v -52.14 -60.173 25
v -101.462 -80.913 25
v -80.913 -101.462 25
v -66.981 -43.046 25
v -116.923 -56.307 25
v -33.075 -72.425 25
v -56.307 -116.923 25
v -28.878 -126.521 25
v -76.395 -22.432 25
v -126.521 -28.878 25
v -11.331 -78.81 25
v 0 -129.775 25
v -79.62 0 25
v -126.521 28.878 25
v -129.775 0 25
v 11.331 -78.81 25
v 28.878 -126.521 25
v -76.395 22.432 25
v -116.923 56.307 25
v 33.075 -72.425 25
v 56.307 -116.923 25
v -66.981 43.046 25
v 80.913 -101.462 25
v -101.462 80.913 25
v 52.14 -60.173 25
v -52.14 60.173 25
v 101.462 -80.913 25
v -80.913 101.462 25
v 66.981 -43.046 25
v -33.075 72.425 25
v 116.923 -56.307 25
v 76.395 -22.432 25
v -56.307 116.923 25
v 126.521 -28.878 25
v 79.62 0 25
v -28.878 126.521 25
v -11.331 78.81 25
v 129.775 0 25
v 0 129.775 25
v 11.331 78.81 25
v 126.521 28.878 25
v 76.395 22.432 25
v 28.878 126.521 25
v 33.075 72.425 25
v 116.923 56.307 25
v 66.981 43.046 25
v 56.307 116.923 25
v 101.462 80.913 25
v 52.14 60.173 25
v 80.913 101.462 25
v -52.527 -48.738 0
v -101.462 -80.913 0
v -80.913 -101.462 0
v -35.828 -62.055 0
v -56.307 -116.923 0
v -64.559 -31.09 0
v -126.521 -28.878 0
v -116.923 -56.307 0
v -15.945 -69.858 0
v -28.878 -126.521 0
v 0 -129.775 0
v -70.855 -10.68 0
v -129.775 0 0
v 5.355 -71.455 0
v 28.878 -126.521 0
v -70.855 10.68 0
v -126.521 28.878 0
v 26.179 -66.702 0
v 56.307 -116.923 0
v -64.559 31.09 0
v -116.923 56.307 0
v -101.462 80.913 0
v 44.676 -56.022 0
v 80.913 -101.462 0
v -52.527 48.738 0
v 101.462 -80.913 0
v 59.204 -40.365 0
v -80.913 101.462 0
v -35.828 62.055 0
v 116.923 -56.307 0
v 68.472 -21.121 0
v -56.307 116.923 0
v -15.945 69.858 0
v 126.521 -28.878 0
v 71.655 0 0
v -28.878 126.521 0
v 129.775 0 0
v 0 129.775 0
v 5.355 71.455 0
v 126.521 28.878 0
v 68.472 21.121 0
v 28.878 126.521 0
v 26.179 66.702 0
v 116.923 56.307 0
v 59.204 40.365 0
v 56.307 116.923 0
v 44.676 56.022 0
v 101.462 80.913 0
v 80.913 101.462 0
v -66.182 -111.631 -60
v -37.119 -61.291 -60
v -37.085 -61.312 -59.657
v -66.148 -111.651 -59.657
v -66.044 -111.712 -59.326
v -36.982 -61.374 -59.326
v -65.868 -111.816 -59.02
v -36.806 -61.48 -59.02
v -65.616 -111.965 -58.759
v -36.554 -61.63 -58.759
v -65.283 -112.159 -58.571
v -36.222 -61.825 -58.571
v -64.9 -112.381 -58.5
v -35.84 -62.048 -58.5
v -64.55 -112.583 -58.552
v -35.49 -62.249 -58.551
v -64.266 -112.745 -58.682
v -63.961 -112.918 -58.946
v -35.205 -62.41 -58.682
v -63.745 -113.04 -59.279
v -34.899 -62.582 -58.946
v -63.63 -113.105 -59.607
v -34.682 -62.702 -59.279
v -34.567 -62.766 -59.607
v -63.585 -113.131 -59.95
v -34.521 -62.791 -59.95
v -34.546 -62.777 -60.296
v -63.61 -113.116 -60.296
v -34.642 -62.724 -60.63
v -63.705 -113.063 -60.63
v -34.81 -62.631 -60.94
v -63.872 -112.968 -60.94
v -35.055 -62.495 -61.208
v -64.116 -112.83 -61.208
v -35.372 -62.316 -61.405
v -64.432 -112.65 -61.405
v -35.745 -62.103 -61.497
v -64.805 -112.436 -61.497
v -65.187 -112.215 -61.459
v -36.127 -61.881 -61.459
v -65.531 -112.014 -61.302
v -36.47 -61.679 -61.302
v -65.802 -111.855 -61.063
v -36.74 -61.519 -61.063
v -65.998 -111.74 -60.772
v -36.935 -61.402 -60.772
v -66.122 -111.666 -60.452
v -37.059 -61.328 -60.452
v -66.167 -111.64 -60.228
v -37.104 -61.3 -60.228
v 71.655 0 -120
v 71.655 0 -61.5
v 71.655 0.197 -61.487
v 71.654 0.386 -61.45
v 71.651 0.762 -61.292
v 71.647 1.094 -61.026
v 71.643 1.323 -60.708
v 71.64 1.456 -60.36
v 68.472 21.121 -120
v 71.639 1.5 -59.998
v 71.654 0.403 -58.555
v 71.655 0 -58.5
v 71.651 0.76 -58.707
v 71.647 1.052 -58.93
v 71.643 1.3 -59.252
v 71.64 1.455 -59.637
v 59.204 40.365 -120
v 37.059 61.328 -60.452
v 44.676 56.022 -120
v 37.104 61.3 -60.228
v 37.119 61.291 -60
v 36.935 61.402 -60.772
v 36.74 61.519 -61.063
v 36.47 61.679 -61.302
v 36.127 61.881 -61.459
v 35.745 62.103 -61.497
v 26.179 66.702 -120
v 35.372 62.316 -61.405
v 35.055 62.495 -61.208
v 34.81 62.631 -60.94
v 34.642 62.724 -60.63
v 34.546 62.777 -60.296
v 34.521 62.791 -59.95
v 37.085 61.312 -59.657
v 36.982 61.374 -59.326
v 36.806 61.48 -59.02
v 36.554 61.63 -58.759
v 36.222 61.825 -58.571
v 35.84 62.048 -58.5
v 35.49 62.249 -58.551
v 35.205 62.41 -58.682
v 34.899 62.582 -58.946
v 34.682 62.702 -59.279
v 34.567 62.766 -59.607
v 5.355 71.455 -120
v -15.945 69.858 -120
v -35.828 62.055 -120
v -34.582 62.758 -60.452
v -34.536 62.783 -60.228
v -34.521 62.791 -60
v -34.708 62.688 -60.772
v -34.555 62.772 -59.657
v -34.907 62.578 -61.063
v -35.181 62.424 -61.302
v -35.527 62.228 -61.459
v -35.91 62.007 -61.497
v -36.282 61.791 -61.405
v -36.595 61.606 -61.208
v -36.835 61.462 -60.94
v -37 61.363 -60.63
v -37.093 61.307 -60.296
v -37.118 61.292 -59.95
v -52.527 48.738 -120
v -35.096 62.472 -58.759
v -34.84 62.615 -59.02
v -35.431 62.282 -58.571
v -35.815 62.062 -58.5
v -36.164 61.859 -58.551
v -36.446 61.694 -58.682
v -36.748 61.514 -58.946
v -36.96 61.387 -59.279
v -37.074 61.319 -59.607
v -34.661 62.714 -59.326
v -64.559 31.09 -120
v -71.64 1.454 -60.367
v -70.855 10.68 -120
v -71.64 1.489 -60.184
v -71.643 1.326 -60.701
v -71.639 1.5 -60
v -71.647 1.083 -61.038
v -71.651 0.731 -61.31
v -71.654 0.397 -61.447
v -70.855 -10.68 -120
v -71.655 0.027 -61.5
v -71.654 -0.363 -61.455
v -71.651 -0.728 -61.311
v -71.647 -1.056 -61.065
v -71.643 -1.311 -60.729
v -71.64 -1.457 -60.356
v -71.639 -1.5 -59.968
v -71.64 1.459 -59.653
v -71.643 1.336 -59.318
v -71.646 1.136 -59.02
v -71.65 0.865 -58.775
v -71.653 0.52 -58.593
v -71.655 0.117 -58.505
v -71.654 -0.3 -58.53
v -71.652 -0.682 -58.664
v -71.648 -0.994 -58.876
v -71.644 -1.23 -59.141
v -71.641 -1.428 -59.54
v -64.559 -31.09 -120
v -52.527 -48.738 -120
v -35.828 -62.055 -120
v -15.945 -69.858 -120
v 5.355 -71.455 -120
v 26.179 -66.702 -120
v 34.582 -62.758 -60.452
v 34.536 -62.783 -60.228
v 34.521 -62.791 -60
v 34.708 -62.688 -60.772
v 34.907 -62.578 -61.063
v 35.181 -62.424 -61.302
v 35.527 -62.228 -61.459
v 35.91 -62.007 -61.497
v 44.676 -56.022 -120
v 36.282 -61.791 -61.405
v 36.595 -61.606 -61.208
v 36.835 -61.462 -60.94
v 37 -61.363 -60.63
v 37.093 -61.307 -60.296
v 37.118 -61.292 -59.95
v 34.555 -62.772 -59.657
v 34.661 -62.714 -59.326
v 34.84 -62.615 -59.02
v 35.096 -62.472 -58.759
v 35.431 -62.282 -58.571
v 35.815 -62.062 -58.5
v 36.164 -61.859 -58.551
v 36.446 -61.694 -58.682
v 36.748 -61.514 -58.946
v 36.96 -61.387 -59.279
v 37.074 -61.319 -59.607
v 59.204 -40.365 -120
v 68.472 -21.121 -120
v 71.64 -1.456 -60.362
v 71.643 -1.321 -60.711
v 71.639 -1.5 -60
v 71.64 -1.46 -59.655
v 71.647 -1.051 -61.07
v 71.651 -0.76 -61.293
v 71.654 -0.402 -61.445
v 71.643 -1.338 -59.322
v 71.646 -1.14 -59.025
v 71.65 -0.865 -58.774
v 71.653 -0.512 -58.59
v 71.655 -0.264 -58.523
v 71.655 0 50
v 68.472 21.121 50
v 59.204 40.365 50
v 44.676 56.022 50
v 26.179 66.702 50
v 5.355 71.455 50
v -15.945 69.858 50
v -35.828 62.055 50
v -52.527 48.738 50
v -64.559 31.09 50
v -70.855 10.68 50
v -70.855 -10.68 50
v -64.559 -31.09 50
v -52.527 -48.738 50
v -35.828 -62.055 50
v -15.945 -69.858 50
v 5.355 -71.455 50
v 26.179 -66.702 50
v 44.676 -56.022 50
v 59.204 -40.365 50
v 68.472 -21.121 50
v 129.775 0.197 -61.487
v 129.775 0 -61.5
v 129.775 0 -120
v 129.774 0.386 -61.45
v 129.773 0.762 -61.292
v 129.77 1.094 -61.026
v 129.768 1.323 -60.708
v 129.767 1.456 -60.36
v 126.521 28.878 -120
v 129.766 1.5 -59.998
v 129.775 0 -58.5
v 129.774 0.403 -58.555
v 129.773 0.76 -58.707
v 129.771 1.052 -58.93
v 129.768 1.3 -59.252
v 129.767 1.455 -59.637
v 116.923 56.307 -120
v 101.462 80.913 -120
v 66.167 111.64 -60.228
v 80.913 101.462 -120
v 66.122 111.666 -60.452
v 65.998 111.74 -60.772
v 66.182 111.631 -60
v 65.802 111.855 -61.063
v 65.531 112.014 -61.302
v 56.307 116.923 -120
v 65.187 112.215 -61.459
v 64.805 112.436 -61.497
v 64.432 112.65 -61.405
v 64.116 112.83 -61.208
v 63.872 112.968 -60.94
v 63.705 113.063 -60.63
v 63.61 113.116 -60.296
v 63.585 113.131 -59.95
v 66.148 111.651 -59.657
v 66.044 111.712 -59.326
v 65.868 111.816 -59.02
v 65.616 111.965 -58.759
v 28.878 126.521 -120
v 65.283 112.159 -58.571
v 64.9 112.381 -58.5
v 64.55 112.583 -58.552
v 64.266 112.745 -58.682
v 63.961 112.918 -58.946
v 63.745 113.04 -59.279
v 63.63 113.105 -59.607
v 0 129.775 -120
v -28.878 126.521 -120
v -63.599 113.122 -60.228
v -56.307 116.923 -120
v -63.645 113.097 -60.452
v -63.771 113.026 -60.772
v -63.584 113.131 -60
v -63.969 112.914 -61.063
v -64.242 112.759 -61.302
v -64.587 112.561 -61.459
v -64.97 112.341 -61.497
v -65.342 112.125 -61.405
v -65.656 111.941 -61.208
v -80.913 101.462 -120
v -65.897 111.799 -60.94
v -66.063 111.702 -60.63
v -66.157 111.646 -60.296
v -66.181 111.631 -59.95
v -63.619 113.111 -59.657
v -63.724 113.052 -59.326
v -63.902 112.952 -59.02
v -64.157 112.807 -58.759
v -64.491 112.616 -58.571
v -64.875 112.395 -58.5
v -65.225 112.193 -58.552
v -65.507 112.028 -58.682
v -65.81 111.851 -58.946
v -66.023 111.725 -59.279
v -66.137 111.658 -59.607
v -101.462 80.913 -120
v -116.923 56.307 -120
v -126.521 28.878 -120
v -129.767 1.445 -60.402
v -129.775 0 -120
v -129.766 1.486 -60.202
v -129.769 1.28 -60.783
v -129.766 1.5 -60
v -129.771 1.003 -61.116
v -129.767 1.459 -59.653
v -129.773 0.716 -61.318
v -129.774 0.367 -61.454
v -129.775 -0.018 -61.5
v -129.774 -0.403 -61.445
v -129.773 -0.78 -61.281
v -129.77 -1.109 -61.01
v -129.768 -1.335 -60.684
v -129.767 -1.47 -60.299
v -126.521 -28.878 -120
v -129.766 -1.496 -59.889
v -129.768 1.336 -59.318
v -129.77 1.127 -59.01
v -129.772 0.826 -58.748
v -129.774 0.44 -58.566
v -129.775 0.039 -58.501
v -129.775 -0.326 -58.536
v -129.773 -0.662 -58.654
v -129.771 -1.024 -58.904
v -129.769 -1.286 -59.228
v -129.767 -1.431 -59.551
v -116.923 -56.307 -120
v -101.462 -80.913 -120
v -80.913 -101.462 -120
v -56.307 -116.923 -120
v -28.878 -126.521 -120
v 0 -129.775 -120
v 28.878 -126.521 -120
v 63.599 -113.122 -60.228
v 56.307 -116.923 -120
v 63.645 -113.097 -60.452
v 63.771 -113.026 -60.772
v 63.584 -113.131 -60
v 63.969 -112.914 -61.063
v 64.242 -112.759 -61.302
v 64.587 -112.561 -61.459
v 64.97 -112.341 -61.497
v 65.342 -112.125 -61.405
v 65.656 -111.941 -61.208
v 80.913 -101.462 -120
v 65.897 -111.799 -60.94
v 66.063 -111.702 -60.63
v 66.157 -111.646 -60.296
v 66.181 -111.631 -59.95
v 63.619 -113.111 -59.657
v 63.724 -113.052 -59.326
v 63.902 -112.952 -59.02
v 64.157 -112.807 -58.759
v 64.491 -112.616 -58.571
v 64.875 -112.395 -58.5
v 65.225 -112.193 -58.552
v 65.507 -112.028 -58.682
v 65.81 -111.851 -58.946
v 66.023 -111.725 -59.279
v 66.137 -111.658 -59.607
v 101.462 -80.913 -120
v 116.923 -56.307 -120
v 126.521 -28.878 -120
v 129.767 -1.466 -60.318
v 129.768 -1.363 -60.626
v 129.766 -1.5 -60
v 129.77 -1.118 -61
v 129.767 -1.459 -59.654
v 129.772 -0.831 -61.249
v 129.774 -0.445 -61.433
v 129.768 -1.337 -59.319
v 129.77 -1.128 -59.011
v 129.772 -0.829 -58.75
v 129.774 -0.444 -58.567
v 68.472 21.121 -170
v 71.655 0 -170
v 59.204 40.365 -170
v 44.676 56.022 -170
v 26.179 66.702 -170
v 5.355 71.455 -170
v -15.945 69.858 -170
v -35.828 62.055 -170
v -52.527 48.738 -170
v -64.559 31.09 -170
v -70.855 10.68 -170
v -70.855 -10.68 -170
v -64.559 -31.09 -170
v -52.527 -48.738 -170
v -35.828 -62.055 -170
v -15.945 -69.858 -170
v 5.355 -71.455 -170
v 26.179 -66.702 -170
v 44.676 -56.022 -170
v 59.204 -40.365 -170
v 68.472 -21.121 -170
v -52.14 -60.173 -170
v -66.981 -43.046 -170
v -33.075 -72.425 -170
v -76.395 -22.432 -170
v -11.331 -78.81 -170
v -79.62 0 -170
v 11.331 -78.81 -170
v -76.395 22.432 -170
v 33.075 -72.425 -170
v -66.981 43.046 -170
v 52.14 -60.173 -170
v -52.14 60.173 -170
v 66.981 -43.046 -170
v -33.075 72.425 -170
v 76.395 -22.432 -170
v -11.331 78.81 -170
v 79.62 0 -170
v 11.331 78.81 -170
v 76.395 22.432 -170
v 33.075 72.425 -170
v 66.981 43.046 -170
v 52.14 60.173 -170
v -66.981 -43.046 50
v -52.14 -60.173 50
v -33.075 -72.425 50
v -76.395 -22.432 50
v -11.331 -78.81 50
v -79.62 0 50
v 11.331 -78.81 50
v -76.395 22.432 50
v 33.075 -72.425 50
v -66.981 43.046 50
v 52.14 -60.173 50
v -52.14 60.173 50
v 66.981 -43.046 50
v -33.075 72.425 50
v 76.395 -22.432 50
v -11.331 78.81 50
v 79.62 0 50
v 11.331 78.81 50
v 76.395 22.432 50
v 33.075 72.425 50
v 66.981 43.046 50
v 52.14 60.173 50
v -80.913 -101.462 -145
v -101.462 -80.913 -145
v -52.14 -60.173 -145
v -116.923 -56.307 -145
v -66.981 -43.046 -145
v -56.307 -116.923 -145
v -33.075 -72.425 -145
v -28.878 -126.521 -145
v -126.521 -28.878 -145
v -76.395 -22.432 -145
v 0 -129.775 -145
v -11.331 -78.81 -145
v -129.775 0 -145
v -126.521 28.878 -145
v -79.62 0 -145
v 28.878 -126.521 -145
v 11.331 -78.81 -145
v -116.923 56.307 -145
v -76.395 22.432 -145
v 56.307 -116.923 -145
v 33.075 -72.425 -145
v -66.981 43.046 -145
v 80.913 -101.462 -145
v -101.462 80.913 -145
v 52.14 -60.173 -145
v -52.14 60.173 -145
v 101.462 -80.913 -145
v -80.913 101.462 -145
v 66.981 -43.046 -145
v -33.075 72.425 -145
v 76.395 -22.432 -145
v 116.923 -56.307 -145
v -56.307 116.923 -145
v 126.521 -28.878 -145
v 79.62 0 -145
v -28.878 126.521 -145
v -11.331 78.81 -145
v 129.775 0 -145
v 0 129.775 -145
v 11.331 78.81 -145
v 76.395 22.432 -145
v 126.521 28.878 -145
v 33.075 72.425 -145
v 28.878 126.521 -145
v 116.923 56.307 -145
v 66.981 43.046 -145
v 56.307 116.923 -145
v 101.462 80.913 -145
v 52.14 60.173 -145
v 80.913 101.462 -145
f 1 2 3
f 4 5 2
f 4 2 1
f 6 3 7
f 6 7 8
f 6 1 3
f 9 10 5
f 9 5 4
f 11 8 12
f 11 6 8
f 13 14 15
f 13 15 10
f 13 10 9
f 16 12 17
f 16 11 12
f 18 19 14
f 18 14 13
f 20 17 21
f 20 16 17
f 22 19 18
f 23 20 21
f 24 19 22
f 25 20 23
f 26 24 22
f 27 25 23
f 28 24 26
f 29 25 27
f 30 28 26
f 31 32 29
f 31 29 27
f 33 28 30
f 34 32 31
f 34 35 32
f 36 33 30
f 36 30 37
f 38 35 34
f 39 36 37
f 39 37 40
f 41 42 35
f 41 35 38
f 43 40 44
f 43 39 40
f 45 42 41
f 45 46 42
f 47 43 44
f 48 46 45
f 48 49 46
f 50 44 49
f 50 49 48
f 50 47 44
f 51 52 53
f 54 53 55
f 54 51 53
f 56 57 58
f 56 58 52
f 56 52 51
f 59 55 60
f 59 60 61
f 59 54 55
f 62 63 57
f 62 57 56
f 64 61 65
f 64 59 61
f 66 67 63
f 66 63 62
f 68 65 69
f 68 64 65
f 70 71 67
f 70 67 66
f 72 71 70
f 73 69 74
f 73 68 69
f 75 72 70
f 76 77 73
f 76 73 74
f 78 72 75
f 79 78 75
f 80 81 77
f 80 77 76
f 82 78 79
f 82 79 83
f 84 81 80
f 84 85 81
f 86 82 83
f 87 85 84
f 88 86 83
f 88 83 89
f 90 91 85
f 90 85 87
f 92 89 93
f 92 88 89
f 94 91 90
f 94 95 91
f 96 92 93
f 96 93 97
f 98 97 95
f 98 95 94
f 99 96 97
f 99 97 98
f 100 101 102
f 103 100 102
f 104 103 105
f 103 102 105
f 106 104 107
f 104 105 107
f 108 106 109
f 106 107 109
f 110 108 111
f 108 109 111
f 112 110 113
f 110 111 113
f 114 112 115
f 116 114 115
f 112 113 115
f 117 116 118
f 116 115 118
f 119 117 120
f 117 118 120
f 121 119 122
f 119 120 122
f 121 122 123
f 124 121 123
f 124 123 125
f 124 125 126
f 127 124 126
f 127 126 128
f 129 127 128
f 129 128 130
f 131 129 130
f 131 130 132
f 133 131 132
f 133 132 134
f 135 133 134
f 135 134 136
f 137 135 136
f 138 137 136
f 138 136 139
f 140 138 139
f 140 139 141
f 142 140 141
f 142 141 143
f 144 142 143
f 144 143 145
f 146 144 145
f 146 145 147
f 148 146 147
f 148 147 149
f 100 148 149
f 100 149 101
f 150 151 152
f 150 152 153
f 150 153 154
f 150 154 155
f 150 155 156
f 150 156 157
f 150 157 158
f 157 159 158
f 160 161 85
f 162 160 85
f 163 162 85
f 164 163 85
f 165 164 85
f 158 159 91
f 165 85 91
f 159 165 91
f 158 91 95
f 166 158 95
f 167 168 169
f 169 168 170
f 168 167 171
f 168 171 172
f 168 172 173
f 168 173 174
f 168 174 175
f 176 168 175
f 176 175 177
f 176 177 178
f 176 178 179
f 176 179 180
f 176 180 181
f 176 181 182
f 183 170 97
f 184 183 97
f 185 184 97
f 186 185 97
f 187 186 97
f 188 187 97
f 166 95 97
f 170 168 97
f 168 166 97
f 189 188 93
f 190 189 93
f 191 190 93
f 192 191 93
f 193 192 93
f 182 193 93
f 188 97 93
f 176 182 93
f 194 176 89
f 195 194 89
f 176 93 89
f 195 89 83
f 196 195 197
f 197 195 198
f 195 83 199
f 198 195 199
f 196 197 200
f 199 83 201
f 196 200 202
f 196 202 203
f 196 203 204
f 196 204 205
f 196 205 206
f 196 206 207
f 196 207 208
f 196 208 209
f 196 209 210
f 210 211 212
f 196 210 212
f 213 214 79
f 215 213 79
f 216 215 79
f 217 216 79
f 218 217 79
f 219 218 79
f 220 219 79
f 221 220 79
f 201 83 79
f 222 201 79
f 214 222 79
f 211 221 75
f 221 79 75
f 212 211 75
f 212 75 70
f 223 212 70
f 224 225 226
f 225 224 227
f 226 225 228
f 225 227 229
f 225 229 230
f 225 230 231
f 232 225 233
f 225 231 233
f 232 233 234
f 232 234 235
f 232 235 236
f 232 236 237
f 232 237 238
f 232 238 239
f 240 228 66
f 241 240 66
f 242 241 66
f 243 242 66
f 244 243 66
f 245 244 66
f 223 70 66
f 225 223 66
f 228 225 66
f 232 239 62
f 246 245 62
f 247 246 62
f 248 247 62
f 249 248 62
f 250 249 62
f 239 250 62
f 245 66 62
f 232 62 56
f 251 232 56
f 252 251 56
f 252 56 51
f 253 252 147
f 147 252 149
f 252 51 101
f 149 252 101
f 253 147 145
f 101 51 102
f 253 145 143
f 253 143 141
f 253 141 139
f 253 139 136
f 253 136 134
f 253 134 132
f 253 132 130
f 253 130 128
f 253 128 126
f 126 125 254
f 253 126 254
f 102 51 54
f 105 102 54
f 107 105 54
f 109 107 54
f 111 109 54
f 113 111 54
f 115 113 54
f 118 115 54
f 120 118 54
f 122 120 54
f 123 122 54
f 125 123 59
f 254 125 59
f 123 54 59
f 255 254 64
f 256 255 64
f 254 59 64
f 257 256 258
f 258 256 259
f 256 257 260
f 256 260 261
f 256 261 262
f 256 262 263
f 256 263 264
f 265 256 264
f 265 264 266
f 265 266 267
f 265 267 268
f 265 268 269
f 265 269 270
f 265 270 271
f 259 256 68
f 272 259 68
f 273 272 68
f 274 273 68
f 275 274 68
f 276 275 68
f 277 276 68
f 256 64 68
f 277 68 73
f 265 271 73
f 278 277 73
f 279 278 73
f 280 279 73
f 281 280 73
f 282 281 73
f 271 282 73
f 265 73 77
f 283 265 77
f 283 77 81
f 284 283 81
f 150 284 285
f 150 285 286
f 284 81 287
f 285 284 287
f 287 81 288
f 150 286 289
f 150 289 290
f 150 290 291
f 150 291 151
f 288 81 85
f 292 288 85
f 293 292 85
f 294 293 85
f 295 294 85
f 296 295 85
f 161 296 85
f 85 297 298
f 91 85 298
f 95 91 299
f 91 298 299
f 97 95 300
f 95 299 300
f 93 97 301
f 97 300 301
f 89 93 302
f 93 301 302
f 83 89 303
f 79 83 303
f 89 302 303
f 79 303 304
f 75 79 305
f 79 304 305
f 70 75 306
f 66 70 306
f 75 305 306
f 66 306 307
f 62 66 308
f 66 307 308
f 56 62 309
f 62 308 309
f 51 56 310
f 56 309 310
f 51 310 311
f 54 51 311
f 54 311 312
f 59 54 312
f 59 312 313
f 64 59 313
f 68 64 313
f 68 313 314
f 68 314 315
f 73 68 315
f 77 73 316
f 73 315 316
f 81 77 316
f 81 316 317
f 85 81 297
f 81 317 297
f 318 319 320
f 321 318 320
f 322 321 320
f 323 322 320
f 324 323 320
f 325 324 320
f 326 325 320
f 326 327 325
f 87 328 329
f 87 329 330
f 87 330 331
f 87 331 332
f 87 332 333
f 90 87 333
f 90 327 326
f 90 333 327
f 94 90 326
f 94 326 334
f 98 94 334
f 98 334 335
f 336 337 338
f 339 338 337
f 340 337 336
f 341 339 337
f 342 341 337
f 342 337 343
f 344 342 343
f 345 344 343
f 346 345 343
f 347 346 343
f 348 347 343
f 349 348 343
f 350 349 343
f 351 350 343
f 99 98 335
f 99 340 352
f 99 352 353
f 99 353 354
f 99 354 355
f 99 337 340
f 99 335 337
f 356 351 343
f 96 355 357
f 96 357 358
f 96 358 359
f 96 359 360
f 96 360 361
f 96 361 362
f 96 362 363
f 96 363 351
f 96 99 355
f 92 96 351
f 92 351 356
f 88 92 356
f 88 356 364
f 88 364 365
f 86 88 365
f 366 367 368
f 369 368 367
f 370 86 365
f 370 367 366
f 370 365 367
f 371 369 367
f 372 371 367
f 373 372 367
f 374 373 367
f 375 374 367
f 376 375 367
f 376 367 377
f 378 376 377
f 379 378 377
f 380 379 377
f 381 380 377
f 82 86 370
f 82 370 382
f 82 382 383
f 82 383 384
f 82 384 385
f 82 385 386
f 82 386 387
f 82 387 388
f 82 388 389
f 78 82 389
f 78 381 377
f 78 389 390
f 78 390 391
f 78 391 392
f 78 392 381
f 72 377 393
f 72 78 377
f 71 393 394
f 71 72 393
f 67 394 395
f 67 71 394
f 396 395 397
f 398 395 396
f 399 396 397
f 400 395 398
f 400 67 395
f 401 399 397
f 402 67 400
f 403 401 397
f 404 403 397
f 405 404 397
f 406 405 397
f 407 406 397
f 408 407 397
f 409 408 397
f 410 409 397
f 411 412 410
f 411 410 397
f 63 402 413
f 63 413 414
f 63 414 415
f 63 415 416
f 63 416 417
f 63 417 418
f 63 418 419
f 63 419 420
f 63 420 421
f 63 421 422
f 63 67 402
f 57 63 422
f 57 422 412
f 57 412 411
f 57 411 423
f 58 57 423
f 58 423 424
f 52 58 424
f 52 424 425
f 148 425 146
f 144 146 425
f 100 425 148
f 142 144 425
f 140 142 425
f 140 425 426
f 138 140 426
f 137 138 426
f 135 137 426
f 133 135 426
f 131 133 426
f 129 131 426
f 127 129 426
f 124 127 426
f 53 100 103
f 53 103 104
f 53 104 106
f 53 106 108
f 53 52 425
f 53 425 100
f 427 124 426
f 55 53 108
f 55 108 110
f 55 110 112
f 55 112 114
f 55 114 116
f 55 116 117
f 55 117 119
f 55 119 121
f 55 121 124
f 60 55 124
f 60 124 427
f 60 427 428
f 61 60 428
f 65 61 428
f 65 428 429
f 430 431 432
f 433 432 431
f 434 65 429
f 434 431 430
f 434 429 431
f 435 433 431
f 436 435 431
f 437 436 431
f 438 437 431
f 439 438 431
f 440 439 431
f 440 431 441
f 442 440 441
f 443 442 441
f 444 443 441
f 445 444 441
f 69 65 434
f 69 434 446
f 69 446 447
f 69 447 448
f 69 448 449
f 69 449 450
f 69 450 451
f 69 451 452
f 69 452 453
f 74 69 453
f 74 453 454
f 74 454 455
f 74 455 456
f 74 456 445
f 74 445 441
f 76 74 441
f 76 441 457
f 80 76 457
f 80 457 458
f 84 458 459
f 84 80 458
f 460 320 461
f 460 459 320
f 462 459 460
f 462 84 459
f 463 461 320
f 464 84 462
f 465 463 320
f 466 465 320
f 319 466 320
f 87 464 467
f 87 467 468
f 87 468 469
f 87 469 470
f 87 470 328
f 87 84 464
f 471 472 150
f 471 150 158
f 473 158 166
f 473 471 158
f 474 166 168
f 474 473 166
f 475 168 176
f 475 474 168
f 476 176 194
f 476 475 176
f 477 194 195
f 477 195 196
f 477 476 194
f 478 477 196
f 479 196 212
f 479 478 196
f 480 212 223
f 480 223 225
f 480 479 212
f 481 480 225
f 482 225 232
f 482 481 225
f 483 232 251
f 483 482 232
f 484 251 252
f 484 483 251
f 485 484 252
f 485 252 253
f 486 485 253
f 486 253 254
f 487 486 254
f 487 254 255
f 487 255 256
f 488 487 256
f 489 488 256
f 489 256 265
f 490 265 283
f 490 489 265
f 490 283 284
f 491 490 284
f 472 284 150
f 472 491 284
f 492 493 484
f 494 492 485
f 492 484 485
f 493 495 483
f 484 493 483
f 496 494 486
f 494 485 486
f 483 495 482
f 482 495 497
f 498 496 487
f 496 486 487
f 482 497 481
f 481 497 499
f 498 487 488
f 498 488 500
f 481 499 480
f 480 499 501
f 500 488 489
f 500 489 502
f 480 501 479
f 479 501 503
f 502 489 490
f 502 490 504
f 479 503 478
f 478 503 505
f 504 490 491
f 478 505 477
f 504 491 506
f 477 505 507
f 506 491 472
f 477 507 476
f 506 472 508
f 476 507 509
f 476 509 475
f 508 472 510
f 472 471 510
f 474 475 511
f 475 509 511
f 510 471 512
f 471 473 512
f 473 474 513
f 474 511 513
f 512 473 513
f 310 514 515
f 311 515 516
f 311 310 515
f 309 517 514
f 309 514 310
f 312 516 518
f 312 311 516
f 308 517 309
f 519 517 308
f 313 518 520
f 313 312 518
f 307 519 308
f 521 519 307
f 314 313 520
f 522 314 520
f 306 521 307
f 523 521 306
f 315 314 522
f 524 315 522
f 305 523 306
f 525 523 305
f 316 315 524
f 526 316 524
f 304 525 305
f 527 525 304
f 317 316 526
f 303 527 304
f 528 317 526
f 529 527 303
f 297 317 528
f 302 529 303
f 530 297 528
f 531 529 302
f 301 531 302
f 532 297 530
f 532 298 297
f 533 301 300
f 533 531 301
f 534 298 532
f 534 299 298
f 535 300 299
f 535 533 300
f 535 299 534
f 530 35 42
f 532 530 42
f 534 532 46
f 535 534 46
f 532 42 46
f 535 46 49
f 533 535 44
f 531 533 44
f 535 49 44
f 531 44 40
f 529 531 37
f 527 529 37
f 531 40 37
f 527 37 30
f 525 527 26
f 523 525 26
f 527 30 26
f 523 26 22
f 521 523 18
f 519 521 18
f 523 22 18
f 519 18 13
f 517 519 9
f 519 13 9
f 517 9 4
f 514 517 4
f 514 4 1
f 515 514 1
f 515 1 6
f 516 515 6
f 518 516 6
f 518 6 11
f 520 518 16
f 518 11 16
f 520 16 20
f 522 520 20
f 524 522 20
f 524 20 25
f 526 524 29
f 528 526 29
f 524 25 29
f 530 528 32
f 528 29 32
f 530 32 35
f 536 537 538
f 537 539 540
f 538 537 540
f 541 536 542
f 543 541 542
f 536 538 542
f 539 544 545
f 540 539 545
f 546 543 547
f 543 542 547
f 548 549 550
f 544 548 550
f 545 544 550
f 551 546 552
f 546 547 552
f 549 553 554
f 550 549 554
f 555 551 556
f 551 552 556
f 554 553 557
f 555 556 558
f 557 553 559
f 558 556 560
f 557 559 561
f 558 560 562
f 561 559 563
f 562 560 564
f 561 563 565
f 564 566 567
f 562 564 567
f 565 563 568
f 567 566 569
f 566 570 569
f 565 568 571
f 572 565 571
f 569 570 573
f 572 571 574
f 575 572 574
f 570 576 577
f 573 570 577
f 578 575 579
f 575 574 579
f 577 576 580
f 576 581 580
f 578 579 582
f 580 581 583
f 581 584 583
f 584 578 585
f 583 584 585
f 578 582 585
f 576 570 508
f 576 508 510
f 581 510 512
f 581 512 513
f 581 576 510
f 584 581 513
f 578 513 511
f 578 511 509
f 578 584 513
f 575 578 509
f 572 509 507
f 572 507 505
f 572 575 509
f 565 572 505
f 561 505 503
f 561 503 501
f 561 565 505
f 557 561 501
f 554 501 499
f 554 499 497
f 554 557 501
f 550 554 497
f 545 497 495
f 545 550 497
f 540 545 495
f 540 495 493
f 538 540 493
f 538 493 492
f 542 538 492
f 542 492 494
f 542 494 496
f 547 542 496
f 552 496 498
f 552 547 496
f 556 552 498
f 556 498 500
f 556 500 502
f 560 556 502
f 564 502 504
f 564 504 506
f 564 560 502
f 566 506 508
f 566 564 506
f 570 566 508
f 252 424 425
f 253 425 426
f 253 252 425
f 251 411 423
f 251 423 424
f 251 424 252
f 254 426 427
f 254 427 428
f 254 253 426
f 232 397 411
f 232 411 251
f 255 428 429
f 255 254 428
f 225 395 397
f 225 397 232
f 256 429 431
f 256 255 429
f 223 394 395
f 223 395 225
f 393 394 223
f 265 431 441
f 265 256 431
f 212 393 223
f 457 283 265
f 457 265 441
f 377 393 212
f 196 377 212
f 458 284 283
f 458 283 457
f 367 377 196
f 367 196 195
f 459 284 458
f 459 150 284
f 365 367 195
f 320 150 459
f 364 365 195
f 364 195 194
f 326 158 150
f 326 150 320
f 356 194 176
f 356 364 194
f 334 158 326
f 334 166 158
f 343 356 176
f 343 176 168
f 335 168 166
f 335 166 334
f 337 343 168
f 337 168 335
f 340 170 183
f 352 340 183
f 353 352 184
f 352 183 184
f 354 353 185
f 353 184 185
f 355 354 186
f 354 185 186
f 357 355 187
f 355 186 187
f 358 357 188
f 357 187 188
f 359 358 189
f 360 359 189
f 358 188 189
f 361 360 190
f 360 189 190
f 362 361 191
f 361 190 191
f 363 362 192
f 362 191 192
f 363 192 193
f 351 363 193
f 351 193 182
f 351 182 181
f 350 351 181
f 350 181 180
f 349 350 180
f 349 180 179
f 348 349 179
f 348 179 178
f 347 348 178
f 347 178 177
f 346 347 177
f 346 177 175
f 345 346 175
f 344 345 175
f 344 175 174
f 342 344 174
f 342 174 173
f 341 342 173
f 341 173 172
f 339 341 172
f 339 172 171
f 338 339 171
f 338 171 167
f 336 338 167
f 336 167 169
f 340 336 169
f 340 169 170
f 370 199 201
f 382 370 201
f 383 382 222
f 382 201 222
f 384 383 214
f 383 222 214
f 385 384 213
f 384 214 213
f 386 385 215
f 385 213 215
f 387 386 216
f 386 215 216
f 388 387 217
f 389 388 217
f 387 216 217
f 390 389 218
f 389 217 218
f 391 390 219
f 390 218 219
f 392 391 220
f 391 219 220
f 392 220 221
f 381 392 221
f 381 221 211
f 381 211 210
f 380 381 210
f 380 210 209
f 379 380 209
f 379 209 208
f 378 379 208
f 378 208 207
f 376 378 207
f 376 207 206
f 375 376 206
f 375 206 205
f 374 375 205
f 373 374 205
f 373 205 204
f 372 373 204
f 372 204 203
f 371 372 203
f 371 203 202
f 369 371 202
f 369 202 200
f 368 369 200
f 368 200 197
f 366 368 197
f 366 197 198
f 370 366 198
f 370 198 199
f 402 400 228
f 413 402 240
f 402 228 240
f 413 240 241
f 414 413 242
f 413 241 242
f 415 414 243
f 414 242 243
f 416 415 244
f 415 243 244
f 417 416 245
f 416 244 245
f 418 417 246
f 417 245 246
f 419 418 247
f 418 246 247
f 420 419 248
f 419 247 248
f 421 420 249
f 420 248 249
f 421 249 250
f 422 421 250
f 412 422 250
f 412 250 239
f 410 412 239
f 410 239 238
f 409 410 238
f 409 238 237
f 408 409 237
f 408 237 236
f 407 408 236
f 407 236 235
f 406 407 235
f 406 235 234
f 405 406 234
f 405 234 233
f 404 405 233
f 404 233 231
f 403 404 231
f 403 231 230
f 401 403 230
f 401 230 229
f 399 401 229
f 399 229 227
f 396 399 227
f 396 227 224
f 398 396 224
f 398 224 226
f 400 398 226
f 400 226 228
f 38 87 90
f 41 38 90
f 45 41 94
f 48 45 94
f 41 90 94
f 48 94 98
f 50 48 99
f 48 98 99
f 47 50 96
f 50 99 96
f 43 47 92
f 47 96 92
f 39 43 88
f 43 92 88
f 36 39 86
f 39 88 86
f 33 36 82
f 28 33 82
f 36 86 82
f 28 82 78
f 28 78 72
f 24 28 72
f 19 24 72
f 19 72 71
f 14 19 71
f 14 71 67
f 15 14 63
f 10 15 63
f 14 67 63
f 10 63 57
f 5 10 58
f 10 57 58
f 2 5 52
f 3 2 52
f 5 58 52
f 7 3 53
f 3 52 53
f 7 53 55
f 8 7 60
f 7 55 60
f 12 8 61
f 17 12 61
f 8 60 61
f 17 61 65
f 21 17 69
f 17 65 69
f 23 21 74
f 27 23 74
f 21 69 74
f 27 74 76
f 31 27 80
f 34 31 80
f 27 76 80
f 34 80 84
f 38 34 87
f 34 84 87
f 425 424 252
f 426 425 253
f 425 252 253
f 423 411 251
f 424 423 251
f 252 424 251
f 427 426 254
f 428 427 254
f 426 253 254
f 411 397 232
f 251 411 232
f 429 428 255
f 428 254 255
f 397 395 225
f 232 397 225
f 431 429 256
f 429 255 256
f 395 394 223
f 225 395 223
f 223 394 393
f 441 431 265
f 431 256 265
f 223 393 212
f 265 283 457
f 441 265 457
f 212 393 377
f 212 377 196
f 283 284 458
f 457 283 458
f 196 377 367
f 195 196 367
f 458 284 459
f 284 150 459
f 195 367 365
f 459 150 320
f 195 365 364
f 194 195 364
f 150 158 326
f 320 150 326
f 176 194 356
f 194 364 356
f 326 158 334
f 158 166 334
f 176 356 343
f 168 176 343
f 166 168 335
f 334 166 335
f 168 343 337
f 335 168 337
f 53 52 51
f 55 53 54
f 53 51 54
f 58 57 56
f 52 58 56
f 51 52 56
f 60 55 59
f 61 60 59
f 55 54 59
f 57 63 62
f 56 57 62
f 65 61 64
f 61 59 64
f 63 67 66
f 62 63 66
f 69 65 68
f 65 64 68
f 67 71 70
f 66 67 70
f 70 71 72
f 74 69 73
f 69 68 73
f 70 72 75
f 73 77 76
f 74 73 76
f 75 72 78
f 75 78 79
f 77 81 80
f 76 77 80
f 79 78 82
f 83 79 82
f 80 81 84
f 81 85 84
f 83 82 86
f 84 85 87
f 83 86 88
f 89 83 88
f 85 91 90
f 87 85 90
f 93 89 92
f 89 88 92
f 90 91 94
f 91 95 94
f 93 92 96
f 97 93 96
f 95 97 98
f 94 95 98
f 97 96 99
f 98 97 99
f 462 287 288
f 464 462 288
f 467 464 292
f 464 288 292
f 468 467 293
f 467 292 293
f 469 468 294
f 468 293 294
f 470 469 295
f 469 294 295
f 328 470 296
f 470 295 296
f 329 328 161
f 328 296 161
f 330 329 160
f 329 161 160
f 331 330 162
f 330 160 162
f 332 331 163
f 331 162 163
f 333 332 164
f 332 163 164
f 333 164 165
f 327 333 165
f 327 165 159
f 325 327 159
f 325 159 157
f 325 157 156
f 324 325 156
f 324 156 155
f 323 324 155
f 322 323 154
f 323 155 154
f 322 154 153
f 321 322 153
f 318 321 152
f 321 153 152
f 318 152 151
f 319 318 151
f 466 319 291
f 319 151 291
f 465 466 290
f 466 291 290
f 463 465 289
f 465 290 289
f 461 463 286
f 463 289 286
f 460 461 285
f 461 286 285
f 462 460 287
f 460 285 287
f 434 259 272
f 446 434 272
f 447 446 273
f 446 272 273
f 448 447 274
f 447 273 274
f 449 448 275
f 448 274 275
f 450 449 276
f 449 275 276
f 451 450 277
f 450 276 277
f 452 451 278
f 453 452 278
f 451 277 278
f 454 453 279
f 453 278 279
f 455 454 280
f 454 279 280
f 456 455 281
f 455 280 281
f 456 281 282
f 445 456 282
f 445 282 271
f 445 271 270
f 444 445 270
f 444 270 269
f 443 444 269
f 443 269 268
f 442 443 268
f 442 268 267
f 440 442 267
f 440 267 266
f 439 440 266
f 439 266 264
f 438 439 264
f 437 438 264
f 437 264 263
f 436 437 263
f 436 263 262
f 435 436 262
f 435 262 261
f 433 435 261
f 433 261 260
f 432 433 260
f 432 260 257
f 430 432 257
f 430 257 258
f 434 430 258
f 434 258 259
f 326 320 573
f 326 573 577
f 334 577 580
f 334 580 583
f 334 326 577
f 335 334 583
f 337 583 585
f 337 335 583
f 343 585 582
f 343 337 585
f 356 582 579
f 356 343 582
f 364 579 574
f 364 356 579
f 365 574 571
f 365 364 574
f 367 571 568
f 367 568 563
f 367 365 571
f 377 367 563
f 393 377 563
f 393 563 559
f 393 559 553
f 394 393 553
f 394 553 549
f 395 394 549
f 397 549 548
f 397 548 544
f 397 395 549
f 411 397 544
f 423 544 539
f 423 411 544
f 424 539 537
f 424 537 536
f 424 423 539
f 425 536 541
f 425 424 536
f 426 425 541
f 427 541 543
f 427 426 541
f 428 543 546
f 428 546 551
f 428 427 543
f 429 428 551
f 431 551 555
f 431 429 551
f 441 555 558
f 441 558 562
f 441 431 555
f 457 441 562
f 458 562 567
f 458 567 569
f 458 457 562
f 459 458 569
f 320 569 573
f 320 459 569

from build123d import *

# Parameters (mm, degrees)
F0_R             = 129.775
F1_DEPTH         = 25
F2_R             = 79.62
F3_DEPTH         = 25
F4_R             = 71.655
F5_DEPTH         = 50
F6_R             = 129.775
F7_DEPTH         = 120
F9_DEPTH         = 170.001
F8_R             = 1.5
F10_DEPTH        = 129.776
F10_COPIES_COUNT = 6


# Not quite as in the source:
# - a pattern or mirror of a feature is missing from the dataset's text; its kind, count and spacing are read off the source's solid


with BuildPart() as f1:
    # F0 (on Top) → F1 (new body)
    with BuildSketch(Plane.XY):
        Circle(F0_R)
    extrude(amount=F1_DEPTH)

    # F2 (on face) → F3 (join)
    with BuildSketch(Plane.XY.offset(25)):
        Circle(F2_R)
    extrude(amount=F3_DEPTH)

    # F4 (on face) → F5 (cut, through all)
    with BuildSketch(Plane.XY.offset(50)):
        Circle(F4_R)
    extrude(amount=-F5_DEPTH, mode=Mode.SUBTRACT)


with BuildPart() as f7:
    # F6 (on Top) → F7 (new body)
    with BuildSketch(Plane.XY):
        Circle(F6_R)
    extrude(amount=-F7_DEPTH)

    # F4 (on face) → F9 (cut, through all)
    with BuildSketch(Plane.XY.offset(50)):
        Circle(F4_R)
    extrude(amount=-F9_DEPTH, mode=Mode.SUBTRACT)

    # F8 (on Right) → F10 (cut, through all)
    with BuildSketch(Plane.YZ):
        with Locations((0, -60)):
            Circle(F8_R)
    f10 = extrude(amount=-F10_DEPTH, mode=Mode.SUBTRACT)

    # F10_copies: F10 ×6 about axis
    f10_copies_axis = Axis((0, 0, 0), (0, 0, 1))
    for i in range(1, F10_COPIES_COUNT):
        add(f10.rotate(f10_copies_axis, i * 360 / F10_COPIES_COUNT), mode=Mode.SUBTRACT)


with BuildPart() as f12_1:
    # F12: instance of F1
    add(f1.part.mirror(Plane.XY.offset(-60)))


solid = Compound([f1.part, f7.part, f12_1.part])
